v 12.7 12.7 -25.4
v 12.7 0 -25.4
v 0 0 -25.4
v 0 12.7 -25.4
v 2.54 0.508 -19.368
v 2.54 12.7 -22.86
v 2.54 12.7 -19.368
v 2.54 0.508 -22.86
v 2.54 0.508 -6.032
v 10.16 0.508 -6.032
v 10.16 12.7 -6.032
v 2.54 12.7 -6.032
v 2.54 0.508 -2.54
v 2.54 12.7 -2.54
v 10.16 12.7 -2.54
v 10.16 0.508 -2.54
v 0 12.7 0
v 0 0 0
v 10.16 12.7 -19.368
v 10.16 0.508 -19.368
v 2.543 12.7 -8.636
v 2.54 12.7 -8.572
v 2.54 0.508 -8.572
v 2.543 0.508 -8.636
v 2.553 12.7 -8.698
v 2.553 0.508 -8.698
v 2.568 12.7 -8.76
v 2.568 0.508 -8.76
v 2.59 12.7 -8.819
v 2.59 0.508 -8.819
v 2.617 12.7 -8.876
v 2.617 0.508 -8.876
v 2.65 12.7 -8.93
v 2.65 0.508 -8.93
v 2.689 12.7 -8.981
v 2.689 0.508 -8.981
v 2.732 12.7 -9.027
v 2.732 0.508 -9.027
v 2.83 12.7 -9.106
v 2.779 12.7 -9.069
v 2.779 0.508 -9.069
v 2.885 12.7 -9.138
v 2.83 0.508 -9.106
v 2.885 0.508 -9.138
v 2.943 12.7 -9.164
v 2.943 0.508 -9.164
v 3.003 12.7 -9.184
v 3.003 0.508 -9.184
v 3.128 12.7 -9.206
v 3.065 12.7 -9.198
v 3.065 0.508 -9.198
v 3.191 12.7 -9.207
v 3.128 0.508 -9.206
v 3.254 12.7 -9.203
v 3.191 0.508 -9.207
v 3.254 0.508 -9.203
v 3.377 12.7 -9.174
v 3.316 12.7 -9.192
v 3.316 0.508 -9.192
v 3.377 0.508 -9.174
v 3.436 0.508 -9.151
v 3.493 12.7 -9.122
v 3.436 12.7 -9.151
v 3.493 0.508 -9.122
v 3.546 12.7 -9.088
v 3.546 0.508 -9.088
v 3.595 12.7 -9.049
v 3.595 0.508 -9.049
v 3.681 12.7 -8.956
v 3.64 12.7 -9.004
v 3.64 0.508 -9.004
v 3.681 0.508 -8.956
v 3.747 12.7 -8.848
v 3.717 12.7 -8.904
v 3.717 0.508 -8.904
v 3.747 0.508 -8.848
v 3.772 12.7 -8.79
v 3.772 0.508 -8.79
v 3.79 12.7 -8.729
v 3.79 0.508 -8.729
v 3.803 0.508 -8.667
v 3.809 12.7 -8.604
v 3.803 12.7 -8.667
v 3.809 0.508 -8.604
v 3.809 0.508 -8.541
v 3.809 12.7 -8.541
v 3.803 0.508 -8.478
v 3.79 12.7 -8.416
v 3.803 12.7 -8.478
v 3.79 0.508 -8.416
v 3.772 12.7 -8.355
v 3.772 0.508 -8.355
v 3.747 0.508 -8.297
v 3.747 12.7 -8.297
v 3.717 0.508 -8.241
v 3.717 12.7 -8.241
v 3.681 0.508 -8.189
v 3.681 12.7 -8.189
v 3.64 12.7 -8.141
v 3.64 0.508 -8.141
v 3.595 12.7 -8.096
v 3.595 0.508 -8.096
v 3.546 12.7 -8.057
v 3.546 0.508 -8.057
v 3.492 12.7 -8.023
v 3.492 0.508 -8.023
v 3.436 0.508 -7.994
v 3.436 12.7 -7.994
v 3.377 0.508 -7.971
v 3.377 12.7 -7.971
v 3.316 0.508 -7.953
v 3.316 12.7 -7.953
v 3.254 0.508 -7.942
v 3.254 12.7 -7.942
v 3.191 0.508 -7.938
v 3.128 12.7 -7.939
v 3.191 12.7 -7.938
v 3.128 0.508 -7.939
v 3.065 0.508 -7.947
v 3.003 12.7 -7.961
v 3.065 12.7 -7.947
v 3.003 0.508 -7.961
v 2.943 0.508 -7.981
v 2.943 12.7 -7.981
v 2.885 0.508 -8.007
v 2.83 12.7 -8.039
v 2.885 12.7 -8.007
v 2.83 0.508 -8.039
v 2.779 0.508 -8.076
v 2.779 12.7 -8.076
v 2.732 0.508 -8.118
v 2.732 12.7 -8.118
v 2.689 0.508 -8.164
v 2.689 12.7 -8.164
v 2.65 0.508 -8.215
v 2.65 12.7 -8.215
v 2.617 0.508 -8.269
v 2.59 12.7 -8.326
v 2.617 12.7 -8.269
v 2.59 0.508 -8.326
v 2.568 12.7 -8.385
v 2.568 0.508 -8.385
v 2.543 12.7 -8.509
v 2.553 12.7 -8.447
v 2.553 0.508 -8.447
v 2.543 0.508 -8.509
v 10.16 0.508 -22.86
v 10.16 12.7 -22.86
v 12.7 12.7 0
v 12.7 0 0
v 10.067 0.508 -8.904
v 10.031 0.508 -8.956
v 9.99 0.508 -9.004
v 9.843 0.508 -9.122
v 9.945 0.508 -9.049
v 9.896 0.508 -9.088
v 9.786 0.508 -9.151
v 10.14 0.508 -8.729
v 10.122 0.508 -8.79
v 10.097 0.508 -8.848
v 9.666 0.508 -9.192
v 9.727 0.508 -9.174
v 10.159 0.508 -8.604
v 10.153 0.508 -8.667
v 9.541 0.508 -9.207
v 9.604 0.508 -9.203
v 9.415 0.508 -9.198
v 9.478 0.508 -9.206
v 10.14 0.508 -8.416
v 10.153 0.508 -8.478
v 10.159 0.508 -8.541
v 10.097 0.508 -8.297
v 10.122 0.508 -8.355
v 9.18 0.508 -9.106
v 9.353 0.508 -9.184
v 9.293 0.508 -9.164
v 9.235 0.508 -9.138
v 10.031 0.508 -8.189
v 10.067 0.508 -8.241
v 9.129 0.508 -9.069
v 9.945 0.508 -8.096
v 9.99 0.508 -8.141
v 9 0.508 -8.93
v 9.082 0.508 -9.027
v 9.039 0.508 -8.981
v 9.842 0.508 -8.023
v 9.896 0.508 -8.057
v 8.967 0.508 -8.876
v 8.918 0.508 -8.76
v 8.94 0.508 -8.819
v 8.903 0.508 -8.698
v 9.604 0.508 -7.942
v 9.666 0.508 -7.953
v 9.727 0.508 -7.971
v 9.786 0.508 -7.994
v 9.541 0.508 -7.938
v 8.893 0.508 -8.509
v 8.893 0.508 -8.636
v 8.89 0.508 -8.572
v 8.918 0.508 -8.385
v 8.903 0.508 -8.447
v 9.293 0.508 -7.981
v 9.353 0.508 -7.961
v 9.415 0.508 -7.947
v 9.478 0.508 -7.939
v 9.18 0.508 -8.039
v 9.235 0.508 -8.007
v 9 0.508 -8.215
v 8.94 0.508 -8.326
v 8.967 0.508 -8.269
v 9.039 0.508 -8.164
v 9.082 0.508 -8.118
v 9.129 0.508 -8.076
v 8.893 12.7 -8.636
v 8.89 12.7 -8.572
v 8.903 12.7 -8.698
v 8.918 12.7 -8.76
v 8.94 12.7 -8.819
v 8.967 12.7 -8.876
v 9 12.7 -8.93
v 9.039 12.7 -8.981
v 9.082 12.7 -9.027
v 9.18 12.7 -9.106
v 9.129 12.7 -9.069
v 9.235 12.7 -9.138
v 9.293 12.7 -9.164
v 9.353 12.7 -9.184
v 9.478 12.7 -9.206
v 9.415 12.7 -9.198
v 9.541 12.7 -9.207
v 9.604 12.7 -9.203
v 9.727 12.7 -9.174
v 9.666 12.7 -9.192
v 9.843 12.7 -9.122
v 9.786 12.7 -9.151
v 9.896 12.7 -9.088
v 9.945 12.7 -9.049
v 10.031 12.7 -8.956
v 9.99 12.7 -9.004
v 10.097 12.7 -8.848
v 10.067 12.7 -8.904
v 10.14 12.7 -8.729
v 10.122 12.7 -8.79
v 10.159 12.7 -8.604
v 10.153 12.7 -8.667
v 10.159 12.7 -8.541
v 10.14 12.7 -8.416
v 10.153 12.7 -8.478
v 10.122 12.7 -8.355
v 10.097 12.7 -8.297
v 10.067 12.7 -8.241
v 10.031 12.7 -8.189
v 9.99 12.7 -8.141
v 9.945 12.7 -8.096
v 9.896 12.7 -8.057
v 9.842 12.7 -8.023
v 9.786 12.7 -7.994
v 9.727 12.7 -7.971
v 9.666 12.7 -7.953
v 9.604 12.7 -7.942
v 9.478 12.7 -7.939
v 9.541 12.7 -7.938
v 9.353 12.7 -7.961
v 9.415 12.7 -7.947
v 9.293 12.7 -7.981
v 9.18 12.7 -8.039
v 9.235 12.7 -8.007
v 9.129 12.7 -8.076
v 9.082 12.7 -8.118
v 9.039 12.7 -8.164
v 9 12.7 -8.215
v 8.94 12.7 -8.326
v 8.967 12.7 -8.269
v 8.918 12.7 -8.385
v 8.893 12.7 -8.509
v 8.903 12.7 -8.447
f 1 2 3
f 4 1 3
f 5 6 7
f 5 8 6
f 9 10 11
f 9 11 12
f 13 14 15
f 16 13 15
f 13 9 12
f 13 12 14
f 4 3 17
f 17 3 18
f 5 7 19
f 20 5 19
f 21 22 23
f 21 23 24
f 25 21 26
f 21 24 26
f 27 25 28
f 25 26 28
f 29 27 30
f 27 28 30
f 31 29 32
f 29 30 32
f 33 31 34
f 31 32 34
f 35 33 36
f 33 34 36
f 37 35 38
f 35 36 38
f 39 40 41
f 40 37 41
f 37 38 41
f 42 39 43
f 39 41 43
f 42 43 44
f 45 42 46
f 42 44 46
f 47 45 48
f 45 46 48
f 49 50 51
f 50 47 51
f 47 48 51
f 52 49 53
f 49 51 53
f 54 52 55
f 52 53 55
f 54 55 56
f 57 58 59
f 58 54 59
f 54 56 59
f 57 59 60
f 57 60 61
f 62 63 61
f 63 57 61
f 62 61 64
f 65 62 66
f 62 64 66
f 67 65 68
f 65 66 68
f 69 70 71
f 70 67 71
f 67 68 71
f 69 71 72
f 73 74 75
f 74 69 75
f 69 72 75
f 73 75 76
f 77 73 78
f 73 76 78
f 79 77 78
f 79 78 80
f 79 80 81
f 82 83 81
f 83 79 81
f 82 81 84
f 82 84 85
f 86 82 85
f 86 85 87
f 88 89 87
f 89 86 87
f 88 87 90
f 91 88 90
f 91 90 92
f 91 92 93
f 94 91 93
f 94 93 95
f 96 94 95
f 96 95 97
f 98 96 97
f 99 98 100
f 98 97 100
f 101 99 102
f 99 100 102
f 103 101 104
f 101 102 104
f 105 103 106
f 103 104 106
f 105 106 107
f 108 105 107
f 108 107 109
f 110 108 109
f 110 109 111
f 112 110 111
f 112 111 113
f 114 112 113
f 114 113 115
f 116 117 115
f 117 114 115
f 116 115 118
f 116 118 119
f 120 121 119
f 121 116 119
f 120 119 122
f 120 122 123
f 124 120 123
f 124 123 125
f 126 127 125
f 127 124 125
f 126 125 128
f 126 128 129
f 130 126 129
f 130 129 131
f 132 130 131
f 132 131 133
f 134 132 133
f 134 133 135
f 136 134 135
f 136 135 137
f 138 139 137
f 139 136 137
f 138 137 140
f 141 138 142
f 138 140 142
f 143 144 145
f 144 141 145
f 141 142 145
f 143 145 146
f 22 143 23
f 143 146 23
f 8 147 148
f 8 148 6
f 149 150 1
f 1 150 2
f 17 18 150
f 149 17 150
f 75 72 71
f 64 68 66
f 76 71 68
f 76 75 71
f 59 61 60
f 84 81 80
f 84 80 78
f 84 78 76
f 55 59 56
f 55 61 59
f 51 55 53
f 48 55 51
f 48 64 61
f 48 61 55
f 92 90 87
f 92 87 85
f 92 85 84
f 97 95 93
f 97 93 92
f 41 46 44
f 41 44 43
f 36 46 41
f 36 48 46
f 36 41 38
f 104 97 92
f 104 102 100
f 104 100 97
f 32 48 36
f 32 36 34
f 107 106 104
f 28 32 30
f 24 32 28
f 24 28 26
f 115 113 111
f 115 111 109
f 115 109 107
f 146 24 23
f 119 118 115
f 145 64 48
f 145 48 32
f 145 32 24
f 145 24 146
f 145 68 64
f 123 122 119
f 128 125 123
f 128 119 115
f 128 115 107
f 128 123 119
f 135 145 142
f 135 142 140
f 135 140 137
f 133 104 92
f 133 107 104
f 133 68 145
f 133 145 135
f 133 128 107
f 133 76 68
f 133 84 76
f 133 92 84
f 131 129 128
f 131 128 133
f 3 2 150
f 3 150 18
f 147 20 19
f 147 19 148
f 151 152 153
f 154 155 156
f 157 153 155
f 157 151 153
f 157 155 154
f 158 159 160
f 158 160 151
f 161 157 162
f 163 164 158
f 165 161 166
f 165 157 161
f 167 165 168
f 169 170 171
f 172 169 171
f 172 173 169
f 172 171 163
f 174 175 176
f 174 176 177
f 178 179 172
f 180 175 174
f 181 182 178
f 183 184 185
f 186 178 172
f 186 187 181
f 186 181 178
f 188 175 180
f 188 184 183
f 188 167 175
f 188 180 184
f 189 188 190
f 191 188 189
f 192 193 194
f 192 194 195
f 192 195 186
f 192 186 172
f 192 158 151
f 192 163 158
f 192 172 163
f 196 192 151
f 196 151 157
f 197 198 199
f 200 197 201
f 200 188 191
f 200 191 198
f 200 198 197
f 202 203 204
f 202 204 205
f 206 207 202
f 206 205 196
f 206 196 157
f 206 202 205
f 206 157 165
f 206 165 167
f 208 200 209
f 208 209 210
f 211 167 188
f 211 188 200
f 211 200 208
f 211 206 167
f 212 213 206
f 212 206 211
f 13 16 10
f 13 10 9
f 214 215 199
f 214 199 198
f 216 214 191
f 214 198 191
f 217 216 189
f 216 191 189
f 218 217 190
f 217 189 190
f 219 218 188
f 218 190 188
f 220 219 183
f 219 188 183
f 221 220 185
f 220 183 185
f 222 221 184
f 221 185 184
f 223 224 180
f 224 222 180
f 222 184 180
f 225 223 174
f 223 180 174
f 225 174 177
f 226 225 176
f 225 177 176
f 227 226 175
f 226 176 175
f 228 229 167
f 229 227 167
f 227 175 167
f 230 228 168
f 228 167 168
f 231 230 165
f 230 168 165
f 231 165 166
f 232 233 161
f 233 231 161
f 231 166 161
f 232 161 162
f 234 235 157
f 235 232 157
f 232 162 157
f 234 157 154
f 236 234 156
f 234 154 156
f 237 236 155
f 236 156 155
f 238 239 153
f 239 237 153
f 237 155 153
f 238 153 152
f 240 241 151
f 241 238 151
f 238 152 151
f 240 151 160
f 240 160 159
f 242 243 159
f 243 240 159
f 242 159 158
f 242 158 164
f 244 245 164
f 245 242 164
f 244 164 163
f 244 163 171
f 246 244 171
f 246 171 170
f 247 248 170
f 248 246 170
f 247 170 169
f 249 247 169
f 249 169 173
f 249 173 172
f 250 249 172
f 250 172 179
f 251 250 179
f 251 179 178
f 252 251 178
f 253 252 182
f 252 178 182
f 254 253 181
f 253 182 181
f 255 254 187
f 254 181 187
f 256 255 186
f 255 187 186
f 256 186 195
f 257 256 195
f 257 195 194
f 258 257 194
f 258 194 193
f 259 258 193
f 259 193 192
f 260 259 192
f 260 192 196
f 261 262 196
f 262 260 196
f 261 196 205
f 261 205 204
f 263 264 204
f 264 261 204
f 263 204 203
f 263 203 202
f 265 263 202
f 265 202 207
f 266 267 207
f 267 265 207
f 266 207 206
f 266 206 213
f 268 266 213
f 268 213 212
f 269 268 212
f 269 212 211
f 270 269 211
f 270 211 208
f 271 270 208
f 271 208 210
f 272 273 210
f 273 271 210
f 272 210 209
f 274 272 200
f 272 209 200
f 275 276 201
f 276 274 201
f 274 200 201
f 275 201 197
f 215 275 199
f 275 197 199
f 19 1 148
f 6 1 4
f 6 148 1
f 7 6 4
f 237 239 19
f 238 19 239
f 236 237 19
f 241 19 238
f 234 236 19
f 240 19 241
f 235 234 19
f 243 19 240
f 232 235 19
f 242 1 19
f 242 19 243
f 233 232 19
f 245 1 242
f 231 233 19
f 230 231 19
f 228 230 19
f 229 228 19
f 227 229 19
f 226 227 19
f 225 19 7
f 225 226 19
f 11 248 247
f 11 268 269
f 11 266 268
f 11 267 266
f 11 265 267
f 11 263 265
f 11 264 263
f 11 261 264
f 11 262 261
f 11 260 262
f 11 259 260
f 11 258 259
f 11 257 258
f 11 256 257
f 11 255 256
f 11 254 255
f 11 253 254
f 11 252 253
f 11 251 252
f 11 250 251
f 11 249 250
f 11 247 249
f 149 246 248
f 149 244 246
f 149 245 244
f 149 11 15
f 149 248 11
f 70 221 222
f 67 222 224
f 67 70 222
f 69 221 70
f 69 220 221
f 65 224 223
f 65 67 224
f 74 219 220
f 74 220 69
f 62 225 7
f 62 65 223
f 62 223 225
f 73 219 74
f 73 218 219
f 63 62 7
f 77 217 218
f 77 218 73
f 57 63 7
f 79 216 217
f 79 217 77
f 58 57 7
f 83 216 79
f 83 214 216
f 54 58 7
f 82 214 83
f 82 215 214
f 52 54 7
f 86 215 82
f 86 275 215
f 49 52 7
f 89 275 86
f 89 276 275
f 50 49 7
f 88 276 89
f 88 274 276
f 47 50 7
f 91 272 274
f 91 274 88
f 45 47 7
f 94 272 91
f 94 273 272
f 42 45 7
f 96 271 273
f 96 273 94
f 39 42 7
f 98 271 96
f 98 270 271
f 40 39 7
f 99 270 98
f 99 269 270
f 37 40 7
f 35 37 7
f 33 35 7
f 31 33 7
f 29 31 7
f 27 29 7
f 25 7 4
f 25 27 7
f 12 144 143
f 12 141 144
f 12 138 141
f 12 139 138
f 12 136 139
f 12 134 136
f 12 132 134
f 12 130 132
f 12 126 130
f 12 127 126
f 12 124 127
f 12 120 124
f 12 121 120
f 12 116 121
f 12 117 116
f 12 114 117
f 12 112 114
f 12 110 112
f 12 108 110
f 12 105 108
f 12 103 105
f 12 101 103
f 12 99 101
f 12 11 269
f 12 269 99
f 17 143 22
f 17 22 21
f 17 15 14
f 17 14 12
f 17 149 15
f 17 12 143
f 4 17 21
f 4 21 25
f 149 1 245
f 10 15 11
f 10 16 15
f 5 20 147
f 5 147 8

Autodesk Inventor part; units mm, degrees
ref_plane "YZ Plane" through (0, 0, 0) normal (1, 0, 0) x (0, 1, 0)
ref_plane "XZ Plane" through (0, 0, 0) normal (0, 1, 0) x (-1, 0, 0)
ref_plane "XY Plane" through (0, 0, 0) normal (0, 0, 1) x (1, 0, 0)
sketch "Sketch1" plane through (0, 0, 0) normal (0, 1, 0) x (-1, 0, 0)
  line L0 (0, 0) -> (-12.7, 0)
  line L1 (-12.7, 0) -> (-12.7, -25.4)
  line L2 (-12.7, -25.4) -> (0, -25.4)
  line L3 (0, -25.4) -> (0, 0)
  line L4 (-2.54, -2.54) -> (-10.16, -2.54)
  line L5 (-10.16, -2.54) -> (-10.16, -6.0325)
  line L6 (-10.16, -6.0325) -> (-2.54, -6.0325)
  line L7 (-2.54, -6.0325) -> (-2.54, -2.54)
  circle A0 centre (-3.175, -8.5725) radius 0.635
  circle A1 centre (-9.525, -8.5725) radius 0.635
  line L8 (-2.54, -19.3675) -> (-10.16, -19.3675)
  line L9 (-10.16, -19.3675) -> (-10.16, -22.86)
  line L10 (-10.16, -22.86) -> (-2.54, -22.86)
  line L11 (-2.54, -22.86) -> (-2.54, -19.3675)
  dimension "d0" = 12.7
  dimension "d1" = 25.4
  dimension "d2" = 2.54
  dimension "d3" = 2.54
  dimension "d4" = 2.54
  dimension "d5" = 1.27
  dimension "d6" = 2.54
  dimension "d7" = 2.54
  dimension "d8" = 2.54
extrude "Extrusion1" add sketch "Sketch1" along normal blind 12.7
extrude "Extrusion2" add sketch "Sketch1" along normal blind 0.508 contours L7 L6 L5 L4 | A0 | A1 | L11 L10 L9 L8
properties part number "Wrist Base"
